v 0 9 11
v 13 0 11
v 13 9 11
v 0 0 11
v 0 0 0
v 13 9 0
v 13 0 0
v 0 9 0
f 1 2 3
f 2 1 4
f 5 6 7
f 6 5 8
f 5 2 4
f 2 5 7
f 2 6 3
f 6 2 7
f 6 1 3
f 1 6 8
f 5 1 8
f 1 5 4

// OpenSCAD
// Generated by SolidPython 1.0.1 on 2020-07-29 00:46:55


cube(size = [13, 9, 11]);
/***********************************************
*********      SolidPython code:      **********
************************************************
 
# import packages: SolidPython
from solid import *
from solid.utils import *
from itertools import chain, combinations, permutations


class Resize:

    def __init__(self, scad_file):
        self.scad_file = scad_file
        #self.scad_file = import_scad(scad_file)
        # cone/cylinder param:
        self.r1 = 0
        self.r2 = 0
        self.h = 0
        # rectangular prism param:
        self.w = 0
        self.l = 0
        # ellipse param:
        self.r = 0

    # import OpenScad code (file name corresponds to shape)


    # classify shape + parameters
    def assign(self, param1, param2, param3):
        if self.scad_file == 'cone.scad':
            self.r1 = param1
            self.r2 = param2
            self.h = param3
        elif self.scad_file == 'cylinder.scad':
            self.r1 = param1
            self.r2 = param2
            self.h = param3
        elif self.scad_file == 'rectangularPrism.scad':
            self.h = param1
            self.l = param2
            self.w = param3
        else:
            self.r = param1
            self.h = param2

    # resize parameters
    def iterate(self):
        x = range(3, 20, 2)
        i = 1
        if self.scad_file == 'cone.scad':
            tempList = list(permutations(x, 2))
            for temp in tempList:
                param1 = temp[0]
                param2 = temp[1]
                filepath = 'produced_scad_files/' + 'cone' + str(param1) + '_' + str(param2) + '_' + '.scad'
                scad_render_to_file(cylinder(h=param1, r1=param2, r2=0), filepath)

        elif self.scad_file == 'cylinder.scad':
            tempList = list(permutations(x, 3))
            for temp in tempList:
                param1 = temp[0]
                param2 = temp[1]
                filepath = 'produced_scad_files/' + 'cylinder' + str(param1) + '_' + str(param2) + '_' + '.scad'
                scad_render_to_file(cylinder(h=param1, r1=param2, r2=param2), filepath)

        elif self.scad_file == 'rectangularPrism.scad':
            tempList = list(permutations(x, 3))
            for temp in tempList:
                param1 = temp[0]
                param2 = temp[1]
                param3 = temp[2]
                filepath = 'produced_scad_files/' + 'rectangularPrism' + str(param1) + '_' + str(param2) + '_' + str(
                    param3) + '.scad'
                scad_render_to_file(cube(size=(param1, param2, param3)), filepath)

        elif self.scad_file == 'ellipse.scad':
            tempList = list(permutations(x, 4))
            for temp in tempList:
                param1 = temp[0]
                param2 = temp[1]
                param3 = temp[2]
                param4 = temp[3]
                filepath = 'produced_scad_files/' + 'ellipse' + str(param1) + '_' + str(param2) + '_' + str(param3) + '_' + str(param4) + '.scad'
                scad_render_to_file(scale([param1, param2, param3])(sphere(r=param4)), filepath)

    def render_to_scadfile(self):
        scad_render_to_file(scad, 'example.scad') 
 
************************************************/
